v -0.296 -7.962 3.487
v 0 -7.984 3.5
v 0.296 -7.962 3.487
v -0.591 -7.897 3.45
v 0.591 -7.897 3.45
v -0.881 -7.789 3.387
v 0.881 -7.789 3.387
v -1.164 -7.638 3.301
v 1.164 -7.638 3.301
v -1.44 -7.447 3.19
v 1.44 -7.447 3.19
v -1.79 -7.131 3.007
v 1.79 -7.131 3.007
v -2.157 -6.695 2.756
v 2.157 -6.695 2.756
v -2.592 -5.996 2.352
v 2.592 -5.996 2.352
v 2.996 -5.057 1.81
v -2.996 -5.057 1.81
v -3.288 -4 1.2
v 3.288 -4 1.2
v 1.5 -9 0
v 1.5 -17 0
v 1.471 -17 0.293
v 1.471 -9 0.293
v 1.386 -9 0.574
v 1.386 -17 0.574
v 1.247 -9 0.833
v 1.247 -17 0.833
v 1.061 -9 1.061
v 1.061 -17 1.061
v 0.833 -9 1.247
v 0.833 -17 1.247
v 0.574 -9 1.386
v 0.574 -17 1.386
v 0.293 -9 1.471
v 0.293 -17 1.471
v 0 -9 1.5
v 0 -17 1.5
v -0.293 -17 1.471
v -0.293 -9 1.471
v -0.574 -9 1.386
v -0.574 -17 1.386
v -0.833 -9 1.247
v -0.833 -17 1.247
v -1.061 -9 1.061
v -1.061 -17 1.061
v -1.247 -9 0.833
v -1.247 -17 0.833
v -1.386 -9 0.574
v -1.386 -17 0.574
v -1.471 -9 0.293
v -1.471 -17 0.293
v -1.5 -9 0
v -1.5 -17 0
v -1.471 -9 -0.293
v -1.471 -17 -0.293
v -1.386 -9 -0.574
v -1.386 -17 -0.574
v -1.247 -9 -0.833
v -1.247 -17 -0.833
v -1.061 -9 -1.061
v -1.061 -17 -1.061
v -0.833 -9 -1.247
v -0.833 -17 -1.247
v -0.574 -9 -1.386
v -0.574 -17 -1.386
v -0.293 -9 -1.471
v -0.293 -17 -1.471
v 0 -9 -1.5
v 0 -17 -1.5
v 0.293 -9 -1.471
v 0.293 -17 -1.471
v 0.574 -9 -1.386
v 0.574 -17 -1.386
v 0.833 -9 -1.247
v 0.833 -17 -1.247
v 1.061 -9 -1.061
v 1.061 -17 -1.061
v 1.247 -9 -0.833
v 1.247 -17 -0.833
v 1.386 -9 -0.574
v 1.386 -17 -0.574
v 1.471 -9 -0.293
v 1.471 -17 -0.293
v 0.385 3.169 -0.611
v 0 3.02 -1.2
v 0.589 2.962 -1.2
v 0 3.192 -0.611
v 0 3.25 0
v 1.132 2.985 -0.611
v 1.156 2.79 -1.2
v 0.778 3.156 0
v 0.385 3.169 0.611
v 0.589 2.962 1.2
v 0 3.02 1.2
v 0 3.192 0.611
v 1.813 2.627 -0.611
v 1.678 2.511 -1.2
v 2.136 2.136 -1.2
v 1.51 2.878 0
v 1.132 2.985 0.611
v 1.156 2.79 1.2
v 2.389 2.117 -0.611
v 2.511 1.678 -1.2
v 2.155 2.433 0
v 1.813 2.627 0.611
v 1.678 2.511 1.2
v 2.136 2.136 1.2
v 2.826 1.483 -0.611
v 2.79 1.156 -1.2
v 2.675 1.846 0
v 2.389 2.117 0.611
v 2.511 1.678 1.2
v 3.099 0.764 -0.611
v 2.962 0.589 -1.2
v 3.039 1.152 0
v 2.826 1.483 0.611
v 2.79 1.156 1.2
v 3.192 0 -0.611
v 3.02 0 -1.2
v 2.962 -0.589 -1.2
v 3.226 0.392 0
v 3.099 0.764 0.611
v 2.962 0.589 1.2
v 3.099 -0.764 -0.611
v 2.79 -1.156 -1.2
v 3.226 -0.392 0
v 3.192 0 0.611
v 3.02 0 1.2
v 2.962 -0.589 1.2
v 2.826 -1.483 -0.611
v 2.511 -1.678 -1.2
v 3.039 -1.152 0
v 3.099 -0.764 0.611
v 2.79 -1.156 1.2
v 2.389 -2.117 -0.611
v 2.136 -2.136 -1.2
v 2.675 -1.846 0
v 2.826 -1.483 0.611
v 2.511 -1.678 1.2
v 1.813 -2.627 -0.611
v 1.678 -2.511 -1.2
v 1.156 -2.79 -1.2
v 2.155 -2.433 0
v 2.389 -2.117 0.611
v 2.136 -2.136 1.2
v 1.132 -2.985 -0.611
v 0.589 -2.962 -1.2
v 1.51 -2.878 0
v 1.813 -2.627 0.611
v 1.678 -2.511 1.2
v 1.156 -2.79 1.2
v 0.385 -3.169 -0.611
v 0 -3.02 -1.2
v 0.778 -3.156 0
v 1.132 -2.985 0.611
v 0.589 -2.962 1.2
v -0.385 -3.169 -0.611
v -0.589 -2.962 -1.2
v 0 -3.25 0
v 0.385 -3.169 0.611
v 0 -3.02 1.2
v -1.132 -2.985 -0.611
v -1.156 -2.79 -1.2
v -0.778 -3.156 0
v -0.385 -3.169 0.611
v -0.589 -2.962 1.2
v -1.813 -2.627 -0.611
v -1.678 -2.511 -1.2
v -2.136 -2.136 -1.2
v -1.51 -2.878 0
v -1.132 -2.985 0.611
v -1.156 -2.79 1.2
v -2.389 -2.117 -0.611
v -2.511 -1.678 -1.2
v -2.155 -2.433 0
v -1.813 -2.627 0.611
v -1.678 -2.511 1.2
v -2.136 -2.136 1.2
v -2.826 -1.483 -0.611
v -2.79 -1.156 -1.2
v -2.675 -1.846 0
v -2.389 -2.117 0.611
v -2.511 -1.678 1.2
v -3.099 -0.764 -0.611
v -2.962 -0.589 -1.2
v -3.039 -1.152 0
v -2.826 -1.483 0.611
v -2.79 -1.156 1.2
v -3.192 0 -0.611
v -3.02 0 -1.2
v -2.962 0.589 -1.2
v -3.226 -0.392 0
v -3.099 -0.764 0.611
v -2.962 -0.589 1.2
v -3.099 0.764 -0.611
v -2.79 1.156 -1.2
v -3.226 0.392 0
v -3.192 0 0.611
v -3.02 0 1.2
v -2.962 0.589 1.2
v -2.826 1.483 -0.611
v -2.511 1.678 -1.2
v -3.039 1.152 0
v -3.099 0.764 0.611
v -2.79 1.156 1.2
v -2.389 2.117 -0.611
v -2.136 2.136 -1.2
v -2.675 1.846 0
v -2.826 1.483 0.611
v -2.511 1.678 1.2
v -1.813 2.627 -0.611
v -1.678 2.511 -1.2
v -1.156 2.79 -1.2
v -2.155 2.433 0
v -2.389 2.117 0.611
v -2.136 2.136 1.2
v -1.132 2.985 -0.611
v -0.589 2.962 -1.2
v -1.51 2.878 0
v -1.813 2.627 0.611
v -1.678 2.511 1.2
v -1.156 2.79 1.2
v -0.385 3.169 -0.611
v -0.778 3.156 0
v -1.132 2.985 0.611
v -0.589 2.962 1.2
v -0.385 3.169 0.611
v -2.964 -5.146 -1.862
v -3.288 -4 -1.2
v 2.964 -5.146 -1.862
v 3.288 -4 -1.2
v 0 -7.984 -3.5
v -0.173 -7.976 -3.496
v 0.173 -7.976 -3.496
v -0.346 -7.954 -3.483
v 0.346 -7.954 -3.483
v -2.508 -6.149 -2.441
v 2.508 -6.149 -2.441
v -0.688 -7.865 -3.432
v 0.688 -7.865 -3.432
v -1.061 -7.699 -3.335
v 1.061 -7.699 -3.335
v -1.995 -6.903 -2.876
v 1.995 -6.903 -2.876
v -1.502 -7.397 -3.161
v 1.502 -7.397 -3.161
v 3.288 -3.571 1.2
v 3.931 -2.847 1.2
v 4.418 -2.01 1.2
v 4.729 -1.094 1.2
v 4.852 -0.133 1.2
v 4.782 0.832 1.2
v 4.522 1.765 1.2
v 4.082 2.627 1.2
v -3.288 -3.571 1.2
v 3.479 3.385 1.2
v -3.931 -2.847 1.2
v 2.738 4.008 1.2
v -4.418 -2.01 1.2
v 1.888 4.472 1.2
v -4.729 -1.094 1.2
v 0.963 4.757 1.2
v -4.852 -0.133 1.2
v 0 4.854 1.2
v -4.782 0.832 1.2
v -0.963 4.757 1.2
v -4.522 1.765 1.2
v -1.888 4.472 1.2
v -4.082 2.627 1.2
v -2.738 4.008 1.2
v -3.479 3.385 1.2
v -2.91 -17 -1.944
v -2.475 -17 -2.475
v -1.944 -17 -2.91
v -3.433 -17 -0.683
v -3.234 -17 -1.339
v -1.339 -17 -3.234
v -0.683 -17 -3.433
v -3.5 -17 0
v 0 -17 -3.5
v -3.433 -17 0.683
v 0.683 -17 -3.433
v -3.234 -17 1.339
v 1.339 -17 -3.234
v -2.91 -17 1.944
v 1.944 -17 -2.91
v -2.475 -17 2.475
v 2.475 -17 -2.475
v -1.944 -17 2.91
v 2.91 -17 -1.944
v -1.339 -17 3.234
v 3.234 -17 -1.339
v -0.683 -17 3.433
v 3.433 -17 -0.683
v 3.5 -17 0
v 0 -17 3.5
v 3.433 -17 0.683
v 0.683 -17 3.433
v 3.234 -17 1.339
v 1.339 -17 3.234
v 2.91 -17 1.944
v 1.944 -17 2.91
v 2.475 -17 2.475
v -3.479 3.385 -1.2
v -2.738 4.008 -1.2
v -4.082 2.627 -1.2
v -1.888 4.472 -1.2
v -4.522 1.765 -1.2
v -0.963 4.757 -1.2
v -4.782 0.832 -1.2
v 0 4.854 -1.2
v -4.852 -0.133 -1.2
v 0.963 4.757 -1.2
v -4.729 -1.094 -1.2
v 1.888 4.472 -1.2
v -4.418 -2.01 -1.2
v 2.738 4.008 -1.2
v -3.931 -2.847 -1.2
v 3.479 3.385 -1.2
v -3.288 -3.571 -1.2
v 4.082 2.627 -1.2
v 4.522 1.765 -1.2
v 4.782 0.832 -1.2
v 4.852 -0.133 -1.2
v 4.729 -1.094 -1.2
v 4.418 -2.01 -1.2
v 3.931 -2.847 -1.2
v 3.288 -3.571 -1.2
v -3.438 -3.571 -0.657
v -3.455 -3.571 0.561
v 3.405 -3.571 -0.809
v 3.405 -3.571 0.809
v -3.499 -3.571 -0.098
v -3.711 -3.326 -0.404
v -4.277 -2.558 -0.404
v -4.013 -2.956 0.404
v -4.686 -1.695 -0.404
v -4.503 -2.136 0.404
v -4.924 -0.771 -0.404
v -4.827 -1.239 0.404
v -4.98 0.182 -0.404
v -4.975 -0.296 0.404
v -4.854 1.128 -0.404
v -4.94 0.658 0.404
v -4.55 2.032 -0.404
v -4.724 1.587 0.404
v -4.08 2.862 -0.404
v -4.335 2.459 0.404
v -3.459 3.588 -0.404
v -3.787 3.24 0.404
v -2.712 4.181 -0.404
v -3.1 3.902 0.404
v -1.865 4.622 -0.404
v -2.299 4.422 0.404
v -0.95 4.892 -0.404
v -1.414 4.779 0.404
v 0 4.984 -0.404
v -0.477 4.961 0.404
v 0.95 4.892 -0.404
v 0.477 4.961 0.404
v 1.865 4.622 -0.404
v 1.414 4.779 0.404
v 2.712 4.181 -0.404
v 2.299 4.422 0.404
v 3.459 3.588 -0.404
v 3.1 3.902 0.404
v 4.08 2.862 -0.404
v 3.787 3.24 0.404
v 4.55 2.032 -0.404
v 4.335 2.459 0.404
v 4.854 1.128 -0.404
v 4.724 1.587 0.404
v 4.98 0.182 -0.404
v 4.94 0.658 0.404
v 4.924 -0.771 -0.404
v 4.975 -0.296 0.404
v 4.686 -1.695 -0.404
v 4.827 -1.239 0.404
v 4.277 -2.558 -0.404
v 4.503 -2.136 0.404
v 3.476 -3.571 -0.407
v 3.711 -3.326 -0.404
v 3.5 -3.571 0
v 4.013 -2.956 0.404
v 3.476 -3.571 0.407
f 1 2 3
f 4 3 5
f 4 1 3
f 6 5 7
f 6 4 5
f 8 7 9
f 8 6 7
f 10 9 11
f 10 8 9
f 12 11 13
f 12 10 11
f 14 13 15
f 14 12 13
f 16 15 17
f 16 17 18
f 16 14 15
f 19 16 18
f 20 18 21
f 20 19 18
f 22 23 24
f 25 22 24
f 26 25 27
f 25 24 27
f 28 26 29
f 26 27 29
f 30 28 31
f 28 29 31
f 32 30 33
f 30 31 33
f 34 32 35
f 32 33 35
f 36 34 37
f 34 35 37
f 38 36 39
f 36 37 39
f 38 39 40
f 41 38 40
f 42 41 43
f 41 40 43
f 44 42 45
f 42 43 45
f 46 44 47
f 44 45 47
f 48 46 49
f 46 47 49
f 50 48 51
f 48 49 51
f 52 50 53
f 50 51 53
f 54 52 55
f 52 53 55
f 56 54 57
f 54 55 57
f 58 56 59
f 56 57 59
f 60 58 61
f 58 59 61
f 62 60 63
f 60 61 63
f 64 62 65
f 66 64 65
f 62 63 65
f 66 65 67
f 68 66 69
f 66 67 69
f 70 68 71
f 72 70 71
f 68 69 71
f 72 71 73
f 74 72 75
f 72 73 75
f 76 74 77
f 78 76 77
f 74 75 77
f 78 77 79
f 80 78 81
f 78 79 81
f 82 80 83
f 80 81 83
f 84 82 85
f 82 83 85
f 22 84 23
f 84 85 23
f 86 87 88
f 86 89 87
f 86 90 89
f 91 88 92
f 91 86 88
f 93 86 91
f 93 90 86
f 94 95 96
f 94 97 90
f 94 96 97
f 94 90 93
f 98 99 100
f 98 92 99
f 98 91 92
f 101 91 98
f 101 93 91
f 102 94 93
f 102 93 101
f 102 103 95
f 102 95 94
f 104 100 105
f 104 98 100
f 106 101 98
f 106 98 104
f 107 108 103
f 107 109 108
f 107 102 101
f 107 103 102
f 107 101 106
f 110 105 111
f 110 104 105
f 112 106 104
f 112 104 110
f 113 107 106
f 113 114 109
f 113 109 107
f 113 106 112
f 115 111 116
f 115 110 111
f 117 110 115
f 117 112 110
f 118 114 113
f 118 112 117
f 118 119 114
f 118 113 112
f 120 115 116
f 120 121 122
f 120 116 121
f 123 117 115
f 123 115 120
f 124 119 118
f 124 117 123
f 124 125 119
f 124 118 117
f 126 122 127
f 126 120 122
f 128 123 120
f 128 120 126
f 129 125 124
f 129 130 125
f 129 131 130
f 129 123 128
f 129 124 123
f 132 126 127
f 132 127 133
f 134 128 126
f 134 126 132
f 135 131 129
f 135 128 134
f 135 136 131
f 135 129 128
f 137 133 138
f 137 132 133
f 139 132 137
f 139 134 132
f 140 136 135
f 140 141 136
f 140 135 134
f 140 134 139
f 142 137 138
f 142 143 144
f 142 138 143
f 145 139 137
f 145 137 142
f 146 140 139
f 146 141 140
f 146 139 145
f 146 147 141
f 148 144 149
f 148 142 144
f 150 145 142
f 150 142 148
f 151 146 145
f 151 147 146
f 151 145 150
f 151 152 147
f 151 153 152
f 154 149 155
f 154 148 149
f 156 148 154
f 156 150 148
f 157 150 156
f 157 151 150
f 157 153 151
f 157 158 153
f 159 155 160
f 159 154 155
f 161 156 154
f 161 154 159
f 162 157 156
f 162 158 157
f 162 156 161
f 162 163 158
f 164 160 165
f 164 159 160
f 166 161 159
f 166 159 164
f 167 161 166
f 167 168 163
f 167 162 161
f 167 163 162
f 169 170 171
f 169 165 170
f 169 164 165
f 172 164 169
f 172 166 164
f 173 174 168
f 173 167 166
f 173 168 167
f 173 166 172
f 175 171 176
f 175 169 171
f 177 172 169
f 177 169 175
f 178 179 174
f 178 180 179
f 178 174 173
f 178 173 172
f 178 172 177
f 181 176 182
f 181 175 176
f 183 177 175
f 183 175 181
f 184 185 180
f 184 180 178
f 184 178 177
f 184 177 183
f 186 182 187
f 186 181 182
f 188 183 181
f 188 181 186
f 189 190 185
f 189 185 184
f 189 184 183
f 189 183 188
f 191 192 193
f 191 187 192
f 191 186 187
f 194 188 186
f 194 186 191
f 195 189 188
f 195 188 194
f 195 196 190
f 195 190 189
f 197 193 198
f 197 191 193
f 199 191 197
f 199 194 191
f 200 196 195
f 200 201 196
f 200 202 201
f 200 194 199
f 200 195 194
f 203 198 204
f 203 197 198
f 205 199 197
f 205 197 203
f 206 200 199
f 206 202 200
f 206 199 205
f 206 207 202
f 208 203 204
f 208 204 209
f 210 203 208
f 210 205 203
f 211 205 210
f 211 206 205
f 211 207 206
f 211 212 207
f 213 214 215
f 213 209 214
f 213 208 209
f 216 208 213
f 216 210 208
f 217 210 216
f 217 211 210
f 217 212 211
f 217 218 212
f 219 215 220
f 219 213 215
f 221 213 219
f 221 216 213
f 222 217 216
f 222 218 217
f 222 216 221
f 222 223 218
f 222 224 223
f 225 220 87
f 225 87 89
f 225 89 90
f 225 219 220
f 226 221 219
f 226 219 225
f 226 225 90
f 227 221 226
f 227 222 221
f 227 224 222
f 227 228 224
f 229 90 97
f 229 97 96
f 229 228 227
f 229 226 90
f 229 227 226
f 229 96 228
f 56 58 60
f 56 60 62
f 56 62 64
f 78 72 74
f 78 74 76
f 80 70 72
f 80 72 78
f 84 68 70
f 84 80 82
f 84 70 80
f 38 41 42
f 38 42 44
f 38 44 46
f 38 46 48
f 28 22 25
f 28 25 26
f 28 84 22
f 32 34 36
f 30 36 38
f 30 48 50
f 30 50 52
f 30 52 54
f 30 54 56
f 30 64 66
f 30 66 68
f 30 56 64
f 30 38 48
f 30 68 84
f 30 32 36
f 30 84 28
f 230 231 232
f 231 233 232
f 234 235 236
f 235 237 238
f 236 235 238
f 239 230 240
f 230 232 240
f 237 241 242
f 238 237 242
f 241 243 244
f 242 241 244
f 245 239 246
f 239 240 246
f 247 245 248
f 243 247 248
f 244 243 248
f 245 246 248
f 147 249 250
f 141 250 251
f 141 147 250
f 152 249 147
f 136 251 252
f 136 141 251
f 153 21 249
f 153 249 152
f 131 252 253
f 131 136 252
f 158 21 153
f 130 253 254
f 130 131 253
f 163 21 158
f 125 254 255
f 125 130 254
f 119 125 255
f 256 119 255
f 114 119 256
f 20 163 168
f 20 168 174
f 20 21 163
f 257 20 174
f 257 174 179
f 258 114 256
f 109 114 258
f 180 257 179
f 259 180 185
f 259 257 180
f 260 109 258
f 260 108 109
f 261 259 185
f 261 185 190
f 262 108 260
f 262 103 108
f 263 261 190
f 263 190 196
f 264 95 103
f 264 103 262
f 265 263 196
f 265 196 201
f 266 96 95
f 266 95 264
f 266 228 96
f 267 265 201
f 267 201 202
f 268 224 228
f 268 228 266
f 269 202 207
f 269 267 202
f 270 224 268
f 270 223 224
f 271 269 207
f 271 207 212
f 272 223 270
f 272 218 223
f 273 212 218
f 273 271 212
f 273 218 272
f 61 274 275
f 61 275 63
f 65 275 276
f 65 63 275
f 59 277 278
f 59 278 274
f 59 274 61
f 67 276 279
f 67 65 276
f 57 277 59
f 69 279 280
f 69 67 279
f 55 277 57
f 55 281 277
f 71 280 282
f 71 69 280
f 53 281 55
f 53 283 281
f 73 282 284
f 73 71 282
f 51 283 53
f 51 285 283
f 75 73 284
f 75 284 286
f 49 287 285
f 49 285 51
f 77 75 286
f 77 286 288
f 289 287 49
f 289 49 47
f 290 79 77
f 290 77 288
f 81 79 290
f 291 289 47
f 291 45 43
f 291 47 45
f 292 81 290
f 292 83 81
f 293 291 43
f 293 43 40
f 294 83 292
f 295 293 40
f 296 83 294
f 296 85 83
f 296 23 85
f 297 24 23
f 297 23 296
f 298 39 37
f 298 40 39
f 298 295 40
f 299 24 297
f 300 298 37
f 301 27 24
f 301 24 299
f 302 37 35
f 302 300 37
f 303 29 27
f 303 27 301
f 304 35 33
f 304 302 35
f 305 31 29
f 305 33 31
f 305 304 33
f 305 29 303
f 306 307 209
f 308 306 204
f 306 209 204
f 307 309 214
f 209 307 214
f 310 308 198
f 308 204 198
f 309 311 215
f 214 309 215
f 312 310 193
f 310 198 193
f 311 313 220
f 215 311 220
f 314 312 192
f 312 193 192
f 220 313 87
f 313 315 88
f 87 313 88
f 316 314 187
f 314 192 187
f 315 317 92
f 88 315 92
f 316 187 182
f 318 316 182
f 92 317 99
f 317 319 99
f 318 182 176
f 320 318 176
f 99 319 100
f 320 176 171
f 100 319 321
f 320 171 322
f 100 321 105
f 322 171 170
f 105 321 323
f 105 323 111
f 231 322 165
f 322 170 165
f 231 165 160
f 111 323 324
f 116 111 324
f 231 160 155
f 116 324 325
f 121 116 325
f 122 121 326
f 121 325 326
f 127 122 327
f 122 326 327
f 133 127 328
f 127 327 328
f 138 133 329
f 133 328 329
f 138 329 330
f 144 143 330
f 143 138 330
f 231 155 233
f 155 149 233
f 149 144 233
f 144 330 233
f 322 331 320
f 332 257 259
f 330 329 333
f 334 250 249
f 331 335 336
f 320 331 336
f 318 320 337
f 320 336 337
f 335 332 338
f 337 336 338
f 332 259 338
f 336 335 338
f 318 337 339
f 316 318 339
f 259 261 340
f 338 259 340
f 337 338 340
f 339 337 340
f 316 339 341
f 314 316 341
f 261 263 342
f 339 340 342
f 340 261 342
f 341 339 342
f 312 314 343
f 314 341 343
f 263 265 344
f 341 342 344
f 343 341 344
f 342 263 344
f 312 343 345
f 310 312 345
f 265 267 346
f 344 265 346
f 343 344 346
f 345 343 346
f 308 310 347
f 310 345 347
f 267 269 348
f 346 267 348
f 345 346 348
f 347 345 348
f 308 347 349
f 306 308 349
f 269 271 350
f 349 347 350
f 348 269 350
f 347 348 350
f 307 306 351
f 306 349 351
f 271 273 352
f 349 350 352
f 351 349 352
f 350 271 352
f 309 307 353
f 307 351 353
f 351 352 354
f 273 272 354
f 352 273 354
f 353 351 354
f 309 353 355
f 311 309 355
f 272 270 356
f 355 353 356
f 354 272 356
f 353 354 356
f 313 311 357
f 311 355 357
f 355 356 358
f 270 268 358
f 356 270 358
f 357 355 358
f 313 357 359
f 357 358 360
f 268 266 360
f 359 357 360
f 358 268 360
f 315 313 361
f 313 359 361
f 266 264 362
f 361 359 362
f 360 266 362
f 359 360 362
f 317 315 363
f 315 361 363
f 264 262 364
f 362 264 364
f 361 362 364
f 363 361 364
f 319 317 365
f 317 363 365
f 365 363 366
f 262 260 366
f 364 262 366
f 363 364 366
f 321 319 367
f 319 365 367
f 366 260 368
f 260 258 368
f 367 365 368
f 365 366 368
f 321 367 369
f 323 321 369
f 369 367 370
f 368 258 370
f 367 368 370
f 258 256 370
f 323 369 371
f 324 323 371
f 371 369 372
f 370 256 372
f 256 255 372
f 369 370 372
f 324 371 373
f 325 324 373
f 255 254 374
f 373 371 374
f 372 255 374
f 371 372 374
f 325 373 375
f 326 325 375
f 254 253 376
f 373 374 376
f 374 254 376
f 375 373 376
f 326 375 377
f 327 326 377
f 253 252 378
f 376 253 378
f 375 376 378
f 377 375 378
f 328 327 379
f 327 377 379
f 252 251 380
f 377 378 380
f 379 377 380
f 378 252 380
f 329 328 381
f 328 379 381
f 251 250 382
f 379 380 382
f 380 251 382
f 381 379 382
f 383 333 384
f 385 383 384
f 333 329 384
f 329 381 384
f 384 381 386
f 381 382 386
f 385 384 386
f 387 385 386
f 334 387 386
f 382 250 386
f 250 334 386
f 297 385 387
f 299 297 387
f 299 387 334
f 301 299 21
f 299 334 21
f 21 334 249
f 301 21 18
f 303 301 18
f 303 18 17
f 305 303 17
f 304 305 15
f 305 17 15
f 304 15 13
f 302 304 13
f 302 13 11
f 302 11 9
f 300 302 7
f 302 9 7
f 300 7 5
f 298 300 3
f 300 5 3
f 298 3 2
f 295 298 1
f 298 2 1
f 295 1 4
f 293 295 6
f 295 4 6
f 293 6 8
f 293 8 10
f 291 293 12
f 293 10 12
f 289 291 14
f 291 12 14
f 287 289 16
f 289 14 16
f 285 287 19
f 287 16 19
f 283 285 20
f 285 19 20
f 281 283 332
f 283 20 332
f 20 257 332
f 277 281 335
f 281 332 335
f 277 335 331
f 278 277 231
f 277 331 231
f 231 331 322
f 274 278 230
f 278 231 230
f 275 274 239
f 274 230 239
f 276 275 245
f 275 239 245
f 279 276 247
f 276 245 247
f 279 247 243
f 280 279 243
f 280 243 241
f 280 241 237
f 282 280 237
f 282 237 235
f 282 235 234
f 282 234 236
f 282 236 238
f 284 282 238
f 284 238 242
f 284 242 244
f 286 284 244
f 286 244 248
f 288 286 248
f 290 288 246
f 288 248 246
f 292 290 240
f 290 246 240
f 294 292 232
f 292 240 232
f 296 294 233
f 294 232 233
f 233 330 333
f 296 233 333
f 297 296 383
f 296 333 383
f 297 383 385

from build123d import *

# Parameters (mm, degrees)
F2_R          = 3.5
F3_DEPTH      = 17
F7_DEPTH      = 6
F7_DEPTH_BACK = 6
F8_R          = 1.5
F9_DEPTH      = 8


with BuildPart() as f1:
    # F0 (on Right) → F1 (revolve)
    with BuildSketch(Plane.YZ):
        with BuildLine():
            Line((0, 5), (0, -5))
            ThreePointArc((0, -5), (5, 0), (0, 5))
        make_face()
    revolve(axis=Axis((0, 0, 0), (0, 0, -1)))

    # F2 (on Front) → F3 (join)
    with BuildSketch(Plane.XZ):
        Circle(F2_R)
    extrude(amount=F3_DEPTH)

    # F4 (on Right) → F5 (revolve, cut)
    with BuildSketch(Plane.YZ):
        with BuildLine():
            Line((0, 3.25), (0, -3.25))
            ThreePointArc((0, -3.25), (3.25, 0), (0, 3.25))
        make_face()
    revolve(axis=Axis((0, 0, 0), (0, 0, -1)), mode=Mode.SUBTRACT)

    # F6 (on Right) → F7 (cut, two sides)
    with BuildSketch(Plane.YZ) as f7_sk:
        Polygon((-4, 1.2), (5.5, 1.2), (5.5, 5.2), (-10.9282032303, 5.2), align=None)
        Polygon((-10.9282032303, -5.2), (5.5, -5.2), (5.5, -1.2), (-4, -1.2), align=None)
    extrude(amount=-F7_DEPTH, mode=Mode.SUBTRACT)
    extrude(f7_sk.sketch, amount=F7_DEPTH_BACK, mode=Mode.SUBTRACT)

    # F8 (on face) → F9 (cut)
    with BuildSketch(Plane.XZ.offset(17)):
        Circle(F8_R)
    extrude(amount=-F9_DEPTH, mode=Mode.SUBTRACT)


solid = f1.part
